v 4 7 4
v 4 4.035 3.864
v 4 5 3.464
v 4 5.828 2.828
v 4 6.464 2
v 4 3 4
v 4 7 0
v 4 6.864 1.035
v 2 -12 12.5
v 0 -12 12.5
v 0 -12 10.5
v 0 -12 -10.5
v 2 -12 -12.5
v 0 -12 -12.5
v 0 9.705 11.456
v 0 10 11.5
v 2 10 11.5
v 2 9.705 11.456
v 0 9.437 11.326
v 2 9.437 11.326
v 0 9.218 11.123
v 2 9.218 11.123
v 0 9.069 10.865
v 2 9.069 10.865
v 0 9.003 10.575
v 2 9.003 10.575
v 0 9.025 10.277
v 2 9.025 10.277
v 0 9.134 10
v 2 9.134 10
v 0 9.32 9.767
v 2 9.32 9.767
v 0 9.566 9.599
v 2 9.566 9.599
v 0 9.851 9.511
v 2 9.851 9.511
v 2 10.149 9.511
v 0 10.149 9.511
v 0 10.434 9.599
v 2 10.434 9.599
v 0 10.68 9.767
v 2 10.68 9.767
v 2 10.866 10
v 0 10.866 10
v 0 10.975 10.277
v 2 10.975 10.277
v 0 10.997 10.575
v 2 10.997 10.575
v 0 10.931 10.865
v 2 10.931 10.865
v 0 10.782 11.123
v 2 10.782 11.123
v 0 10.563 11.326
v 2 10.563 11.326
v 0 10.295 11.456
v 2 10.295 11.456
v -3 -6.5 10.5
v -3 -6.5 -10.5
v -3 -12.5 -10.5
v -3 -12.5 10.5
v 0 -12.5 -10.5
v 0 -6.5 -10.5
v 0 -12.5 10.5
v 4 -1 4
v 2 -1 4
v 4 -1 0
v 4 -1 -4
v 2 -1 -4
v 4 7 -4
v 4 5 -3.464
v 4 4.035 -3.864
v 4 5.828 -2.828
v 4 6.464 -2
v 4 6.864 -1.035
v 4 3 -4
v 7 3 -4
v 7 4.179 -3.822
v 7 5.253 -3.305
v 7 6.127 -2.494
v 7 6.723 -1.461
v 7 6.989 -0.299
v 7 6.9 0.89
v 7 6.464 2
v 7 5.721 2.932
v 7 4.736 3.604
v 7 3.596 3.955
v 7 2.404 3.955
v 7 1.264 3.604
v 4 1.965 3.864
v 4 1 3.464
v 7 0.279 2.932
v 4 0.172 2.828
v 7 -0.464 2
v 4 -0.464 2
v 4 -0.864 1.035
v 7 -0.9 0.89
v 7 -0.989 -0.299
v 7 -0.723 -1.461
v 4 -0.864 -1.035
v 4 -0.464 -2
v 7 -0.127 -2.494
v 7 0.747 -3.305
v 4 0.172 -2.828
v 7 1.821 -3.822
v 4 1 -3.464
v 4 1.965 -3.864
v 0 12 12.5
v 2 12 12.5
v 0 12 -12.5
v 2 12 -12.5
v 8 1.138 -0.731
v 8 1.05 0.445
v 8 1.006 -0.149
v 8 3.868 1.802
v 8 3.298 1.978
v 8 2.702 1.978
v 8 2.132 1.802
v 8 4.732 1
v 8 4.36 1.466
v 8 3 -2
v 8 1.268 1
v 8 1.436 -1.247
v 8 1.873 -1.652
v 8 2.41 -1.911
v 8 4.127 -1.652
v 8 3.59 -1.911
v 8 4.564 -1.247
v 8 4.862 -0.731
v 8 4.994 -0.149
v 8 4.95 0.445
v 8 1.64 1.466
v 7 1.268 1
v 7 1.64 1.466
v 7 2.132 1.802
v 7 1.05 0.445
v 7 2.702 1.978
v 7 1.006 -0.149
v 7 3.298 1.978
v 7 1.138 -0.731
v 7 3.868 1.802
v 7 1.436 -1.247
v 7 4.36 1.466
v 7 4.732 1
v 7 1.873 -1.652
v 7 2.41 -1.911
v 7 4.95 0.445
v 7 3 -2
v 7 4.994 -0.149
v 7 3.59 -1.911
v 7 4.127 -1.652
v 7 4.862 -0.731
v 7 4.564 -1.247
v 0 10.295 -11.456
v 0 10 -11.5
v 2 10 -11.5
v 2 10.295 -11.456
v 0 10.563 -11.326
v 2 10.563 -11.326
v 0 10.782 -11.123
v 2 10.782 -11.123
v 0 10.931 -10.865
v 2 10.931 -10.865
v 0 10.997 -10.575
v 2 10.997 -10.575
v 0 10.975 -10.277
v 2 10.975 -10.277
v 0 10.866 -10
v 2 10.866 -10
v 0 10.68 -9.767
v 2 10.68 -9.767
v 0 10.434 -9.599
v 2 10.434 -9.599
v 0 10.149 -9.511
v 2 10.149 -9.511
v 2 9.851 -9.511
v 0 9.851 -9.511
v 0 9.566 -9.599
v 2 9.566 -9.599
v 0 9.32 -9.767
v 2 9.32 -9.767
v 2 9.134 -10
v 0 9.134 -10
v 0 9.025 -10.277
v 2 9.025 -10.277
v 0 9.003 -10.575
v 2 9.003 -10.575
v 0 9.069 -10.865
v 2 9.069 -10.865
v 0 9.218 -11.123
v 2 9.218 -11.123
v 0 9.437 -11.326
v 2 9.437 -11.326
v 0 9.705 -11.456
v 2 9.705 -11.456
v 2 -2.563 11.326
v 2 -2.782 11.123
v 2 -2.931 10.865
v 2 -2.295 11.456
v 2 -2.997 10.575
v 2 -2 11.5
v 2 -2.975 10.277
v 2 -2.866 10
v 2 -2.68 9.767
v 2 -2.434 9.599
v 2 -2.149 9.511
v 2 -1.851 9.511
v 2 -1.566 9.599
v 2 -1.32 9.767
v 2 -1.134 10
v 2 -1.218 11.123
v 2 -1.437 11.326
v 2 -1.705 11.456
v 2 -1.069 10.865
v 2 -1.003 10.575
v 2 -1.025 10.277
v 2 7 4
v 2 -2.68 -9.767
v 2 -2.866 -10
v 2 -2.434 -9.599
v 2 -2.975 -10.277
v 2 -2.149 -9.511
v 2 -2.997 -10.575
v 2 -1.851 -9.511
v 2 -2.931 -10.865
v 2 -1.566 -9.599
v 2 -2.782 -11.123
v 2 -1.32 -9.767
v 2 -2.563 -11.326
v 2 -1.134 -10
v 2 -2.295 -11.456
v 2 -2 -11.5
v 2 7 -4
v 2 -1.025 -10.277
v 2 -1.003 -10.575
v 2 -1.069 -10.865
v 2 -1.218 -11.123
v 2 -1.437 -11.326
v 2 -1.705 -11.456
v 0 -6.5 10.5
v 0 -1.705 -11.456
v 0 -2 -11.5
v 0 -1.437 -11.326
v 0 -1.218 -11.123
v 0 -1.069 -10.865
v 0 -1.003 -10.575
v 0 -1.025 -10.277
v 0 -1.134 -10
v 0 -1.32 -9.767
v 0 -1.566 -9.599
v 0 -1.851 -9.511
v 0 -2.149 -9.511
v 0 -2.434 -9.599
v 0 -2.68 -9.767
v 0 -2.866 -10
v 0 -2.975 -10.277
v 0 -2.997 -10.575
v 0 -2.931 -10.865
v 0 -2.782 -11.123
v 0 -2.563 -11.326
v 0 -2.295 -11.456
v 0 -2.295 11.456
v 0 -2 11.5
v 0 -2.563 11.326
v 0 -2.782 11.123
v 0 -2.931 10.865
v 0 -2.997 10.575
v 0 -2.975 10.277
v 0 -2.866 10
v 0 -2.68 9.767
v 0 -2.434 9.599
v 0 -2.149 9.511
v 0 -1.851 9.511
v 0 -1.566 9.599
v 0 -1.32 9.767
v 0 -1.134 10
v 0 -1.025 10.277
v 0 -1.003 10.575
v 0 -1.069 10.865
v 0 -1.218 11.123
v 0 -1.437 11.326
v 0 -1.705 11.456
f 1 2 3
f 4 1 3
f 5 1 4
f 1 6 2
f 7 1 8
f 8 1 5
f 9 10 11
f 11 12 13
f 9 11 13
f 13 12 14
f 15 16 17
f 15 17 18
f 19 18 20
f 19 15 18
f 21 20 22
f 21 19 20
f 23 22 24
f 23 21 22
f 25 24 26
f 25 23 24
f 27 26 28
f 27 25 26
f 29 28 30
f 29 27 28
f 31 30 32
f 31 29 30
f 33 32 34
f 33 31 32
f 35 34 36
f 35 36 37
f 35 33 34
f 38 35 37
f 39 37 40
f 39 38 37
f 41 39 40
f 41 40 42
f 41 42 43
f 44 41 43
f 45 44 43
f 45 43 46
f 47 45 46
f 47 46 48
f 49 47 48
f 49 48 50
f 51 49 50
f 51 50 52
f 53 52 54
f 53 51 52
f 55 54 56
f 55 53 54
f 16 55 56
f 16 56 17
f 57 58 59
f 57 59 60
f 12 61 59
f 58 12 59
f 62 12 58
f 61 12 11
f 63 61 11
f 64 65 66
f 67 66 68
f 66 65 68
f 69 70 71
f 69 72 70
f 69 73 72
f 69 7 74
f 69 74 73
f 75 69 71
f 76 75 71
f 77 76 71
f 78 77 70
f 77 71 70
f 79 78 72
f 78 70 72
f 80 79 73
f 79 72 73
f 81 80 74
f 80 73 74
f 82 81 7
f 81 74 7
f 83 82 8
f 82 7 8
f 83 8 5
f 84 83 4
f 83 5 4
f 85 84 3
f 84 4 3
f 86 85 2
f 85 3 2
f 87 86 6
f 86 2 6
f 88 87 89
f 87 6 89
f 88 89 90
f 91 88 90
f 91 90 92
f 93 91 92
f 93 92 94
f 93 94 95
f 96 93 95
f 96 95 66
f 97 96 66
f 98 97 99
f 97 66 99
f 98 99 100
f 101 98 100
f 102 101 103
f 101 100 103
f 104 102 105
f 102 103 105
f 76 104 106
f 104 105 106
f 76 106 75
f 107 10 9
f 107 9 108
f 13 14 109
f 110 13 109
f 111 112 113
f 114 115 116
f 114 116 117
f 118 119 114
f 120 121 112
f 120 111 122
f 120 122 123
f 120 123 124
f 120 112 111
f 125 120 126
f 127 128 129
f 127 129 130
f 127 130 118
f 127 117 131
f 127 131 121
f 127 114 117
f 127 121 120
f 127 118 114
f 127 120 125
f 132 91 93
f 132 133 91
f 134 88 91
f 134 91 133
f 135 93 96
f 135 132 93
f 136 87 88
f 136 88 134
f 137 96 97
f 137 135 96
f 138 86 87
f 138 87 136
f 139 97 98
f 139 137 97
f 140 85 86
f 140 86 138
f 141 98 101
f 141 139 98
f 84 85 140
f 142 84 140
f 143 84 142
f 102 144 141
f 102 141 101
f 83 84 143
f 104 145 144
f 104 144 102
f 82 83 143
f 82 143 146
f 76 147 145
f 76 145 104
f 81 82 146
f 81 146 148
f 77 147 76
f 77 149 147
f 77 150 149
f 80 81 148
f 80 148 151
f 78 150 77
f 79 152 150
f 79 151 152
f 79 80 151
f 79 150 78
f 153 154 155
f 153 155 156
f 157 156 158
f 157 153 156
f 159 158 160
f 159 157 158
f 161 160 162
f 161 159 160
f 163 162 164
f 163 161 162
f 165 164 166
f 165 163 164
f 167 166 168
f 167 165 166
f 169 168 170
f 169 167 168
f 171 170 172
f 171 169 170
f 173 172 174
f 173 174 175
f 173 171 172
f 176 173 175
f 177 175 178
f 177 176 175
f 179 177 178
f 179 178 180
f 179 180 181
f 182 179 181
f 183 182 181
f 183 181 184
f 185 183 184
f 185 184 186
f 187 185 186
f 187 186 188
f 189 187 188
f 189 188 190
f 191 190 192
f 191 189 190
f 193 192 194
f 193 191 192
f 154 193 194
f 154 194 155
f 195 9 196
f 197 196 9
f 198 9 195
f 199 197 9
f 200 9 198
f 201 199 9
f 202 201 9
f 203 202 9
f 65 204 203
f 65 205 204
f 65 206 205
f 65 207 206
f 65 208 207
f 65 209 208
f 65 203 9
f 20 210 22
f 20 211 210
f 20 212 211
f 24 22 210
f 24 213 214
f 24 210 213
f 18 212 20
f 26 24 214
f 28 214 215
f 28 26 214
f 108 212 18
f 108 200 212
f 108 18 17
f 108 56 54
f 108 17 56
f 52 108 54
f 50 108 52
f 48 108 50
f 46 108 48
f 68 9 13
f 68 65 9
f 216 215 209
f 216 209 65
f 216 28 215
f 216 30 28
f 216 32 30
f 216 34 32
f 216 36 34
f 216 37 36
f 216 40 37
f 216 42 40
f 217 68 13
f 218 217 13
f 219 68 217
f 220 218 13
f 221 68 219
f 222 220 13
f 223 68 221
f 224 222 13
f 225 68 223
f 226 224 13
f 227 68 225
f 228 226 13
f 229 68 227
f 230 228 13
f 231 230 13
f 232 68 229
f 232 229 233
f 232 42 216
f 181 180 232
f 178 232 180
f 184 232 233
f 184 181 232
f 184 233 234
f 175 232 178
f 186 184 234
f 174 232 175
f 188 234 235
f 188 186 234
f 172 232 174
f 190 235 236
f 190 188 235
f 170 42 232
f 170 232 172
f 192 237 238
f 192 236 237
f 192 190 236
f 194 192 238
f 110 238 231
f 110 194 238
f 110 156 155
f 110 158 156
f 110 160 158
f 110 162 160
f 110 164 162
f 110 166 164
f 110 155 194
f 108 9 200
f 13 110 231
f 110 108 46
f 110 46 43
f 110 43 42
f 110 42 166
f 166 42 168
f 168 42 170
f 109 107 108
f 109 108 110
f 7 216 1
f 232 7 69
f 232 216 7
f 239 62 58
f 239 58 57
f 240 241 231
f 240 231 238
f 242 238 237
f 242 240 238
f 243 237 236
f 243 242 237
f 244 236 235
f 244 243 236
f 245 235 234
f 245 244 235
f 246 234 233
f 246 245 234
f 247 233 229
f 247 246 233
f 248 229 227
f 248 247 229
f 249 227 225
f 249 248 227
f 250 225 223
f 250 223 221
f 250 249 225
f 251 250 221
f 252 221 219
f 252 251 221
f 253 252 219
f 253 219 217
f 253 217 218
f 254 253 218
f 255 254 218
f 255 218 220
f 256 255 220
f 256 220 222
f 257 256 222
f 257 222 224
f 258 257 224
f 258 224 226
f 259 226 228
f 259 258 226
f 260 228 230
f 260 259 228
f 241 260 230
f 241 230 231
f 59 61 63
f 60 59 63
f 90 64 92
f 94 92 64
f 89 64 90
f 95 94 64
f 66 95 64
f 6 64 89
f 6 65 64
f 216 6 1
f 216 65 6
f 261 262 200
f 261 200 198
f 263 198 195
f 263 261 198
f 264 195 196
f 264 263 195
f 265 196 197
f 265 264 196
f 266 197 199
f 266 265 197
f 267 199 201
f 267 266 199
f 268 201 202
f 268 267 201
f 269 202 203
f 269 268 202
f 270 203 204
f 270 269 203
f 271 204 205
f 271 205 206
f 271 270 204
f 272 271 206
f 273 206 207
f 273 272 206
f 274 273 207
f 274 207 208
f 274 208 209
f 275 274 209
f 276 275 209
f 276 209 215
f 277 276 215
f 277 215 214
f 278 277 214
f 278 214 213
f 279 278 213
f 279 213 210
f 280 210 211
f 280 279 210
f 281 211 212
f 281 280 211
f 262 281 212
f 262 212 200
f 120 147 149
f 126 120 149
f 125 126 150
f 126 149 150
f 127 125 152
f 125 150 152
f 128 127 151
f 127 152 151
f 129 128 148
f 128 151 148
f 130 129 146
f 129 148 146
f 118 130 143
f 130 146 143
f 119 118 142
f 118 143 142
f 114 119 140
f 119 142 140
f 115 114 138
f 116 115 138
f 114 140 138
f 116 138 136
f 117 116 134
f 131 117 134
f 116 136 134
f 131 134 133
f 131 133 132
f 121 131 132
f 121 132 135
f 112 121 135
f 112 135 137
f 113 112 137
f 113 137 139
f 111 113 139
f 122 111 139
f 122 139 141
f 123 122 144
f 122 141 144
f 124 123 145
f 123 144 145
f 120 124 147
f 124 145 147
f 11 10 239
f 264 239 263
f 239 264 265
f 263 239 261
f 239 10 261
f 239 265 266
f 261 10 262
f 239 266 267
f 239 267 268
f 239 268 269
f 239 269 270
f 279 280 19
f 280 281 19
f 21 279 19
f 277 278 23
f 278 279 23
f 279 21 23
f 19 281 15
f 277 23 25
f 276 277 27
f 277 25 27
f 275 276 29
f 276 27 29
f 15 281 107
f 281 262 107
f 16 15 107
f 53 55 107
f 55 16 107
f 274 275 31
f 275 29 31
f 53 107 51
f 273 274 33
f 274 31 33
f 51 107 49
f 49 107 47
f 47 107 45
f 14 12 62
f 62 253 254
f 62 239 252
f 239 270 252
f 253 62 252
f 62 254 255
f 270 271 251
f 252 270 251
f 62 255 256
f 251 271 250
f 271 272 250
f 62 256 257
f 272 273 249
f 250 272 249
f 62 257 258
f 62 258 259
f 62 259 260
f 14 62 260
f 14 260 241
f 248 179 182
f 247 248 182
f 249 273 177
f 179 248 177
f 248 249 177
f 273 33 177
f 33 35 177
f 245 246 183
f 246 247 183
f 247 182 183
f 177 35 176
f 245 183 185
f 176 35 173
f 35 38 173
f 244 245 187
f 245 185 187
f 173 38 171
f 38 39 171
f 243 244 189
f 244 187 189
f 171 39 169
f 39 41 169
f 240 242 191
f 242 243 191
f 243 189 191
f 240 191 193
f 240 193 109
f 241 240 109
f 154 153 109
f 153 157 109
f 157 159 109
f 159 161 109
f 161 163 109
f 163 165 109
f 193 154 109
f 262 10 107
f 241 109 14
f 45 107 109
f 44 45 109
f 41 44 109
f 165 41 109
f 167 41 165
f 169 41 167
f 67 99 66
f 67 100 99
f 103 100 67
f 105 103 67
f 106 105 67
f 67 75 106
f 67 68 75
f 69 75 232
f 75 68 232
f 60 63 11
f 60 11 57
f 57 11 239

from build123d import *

# Parameters (mm, degrees)
SKETCH1_W           = 25
SKETCH1_H           = 24
SKETCH1_R           = 1
BOSS_EXTRUDE1_DEPTH = 2
SKETCH2_W           = 8
SKETCH2_H           = 8
BOSS_EXTRUDE2_DEPTH = 2
SKETCH3_R           = 4
BOSS_EXTRUDE3_DEPTH = 3
SKETCH4_R           = 2
BOSS_EXTRUDE4_DEPTH = 1
SKETCH5_W           = 21
SKETCH5_H           = 6
BOSS_EXTRUDE5_DEPTH = 3


with BuildPart() as part:
    # Sketch1 → Boss-Extrude1 (new body)
    with BuildSketch(Plane(origin=(0, 0, 0), x_dir=(0, 0, -1), z_dir=(1, 0, 0))):
        Rectangle(SKETCH1_W, SKETCH1_H)
        with Locations((10.5, 10)):
            Circle(SKETCH1_R, mode=Mode.SUBTRACT)
        with Locations((10.5, -2)):
            Circle(SKETCH1_R, mode=Mode.SUBTRACT)
        with Locations(Location((-10.5, 10, 0), (0, 0, 180))):
            Circle(SKETCH1_R, mode=Mode.SUBTRACT)
        with Locations(Location((-10.5, -2, 0), (0, 0, 180))):
            Circle(SKETCH1_R, mode=Mode.SUBTRACT)
    extrude(amount=BOSS_EXTRUDE1_DEPTH)

    # Sketch2 → Boss-Extrude2 (add)
    with BuildSketch(Plane(origin=(2, 0, 0), x_dir=(0, 0, -1), z_dir=(1, 0, 0))):
        with Locations((0, 3)):
            Rectangle(SKETCH2_W, SKETCH2_H)
    extrude(amount=BOSS_EXTRUDE2_DEPTH)

    # Sketch3 → Boss-Extrude3 (add)
    with BuildSketch(Plane(origin=(4, 0, 0), x_dir=(0, 0, -1), z_dir=(1, 0, 0))):
        with Locations((0, 3)):
            Circle(SKETCH3_R)
    extrude(amount=BOSS_EXTRUDE3_DEPTH)

    # Sketch4 → Boss-Extrude4 (add)
    with BuildSketch(Plane(origin=(7, 0, 0), x_dir=(0, 0, -1), z_dir=(1, 0, 0))):
        with Locations((0, 3)):
            Circle(SKETCH4_R)
    extrude(amount=BOSS_EXTRUDE4_DEPTH)

    # Sketch5 → Boss-Extrude5 (add)
    with BuildSketch(Plane.ZY):
        with Locations((0, -9.5)):
            Rectangle(SKETCH5_W, SKETCH5_H)
    extrude(amount=BOSS_EXTRUDE5_DEPTH)


solid = part.part
